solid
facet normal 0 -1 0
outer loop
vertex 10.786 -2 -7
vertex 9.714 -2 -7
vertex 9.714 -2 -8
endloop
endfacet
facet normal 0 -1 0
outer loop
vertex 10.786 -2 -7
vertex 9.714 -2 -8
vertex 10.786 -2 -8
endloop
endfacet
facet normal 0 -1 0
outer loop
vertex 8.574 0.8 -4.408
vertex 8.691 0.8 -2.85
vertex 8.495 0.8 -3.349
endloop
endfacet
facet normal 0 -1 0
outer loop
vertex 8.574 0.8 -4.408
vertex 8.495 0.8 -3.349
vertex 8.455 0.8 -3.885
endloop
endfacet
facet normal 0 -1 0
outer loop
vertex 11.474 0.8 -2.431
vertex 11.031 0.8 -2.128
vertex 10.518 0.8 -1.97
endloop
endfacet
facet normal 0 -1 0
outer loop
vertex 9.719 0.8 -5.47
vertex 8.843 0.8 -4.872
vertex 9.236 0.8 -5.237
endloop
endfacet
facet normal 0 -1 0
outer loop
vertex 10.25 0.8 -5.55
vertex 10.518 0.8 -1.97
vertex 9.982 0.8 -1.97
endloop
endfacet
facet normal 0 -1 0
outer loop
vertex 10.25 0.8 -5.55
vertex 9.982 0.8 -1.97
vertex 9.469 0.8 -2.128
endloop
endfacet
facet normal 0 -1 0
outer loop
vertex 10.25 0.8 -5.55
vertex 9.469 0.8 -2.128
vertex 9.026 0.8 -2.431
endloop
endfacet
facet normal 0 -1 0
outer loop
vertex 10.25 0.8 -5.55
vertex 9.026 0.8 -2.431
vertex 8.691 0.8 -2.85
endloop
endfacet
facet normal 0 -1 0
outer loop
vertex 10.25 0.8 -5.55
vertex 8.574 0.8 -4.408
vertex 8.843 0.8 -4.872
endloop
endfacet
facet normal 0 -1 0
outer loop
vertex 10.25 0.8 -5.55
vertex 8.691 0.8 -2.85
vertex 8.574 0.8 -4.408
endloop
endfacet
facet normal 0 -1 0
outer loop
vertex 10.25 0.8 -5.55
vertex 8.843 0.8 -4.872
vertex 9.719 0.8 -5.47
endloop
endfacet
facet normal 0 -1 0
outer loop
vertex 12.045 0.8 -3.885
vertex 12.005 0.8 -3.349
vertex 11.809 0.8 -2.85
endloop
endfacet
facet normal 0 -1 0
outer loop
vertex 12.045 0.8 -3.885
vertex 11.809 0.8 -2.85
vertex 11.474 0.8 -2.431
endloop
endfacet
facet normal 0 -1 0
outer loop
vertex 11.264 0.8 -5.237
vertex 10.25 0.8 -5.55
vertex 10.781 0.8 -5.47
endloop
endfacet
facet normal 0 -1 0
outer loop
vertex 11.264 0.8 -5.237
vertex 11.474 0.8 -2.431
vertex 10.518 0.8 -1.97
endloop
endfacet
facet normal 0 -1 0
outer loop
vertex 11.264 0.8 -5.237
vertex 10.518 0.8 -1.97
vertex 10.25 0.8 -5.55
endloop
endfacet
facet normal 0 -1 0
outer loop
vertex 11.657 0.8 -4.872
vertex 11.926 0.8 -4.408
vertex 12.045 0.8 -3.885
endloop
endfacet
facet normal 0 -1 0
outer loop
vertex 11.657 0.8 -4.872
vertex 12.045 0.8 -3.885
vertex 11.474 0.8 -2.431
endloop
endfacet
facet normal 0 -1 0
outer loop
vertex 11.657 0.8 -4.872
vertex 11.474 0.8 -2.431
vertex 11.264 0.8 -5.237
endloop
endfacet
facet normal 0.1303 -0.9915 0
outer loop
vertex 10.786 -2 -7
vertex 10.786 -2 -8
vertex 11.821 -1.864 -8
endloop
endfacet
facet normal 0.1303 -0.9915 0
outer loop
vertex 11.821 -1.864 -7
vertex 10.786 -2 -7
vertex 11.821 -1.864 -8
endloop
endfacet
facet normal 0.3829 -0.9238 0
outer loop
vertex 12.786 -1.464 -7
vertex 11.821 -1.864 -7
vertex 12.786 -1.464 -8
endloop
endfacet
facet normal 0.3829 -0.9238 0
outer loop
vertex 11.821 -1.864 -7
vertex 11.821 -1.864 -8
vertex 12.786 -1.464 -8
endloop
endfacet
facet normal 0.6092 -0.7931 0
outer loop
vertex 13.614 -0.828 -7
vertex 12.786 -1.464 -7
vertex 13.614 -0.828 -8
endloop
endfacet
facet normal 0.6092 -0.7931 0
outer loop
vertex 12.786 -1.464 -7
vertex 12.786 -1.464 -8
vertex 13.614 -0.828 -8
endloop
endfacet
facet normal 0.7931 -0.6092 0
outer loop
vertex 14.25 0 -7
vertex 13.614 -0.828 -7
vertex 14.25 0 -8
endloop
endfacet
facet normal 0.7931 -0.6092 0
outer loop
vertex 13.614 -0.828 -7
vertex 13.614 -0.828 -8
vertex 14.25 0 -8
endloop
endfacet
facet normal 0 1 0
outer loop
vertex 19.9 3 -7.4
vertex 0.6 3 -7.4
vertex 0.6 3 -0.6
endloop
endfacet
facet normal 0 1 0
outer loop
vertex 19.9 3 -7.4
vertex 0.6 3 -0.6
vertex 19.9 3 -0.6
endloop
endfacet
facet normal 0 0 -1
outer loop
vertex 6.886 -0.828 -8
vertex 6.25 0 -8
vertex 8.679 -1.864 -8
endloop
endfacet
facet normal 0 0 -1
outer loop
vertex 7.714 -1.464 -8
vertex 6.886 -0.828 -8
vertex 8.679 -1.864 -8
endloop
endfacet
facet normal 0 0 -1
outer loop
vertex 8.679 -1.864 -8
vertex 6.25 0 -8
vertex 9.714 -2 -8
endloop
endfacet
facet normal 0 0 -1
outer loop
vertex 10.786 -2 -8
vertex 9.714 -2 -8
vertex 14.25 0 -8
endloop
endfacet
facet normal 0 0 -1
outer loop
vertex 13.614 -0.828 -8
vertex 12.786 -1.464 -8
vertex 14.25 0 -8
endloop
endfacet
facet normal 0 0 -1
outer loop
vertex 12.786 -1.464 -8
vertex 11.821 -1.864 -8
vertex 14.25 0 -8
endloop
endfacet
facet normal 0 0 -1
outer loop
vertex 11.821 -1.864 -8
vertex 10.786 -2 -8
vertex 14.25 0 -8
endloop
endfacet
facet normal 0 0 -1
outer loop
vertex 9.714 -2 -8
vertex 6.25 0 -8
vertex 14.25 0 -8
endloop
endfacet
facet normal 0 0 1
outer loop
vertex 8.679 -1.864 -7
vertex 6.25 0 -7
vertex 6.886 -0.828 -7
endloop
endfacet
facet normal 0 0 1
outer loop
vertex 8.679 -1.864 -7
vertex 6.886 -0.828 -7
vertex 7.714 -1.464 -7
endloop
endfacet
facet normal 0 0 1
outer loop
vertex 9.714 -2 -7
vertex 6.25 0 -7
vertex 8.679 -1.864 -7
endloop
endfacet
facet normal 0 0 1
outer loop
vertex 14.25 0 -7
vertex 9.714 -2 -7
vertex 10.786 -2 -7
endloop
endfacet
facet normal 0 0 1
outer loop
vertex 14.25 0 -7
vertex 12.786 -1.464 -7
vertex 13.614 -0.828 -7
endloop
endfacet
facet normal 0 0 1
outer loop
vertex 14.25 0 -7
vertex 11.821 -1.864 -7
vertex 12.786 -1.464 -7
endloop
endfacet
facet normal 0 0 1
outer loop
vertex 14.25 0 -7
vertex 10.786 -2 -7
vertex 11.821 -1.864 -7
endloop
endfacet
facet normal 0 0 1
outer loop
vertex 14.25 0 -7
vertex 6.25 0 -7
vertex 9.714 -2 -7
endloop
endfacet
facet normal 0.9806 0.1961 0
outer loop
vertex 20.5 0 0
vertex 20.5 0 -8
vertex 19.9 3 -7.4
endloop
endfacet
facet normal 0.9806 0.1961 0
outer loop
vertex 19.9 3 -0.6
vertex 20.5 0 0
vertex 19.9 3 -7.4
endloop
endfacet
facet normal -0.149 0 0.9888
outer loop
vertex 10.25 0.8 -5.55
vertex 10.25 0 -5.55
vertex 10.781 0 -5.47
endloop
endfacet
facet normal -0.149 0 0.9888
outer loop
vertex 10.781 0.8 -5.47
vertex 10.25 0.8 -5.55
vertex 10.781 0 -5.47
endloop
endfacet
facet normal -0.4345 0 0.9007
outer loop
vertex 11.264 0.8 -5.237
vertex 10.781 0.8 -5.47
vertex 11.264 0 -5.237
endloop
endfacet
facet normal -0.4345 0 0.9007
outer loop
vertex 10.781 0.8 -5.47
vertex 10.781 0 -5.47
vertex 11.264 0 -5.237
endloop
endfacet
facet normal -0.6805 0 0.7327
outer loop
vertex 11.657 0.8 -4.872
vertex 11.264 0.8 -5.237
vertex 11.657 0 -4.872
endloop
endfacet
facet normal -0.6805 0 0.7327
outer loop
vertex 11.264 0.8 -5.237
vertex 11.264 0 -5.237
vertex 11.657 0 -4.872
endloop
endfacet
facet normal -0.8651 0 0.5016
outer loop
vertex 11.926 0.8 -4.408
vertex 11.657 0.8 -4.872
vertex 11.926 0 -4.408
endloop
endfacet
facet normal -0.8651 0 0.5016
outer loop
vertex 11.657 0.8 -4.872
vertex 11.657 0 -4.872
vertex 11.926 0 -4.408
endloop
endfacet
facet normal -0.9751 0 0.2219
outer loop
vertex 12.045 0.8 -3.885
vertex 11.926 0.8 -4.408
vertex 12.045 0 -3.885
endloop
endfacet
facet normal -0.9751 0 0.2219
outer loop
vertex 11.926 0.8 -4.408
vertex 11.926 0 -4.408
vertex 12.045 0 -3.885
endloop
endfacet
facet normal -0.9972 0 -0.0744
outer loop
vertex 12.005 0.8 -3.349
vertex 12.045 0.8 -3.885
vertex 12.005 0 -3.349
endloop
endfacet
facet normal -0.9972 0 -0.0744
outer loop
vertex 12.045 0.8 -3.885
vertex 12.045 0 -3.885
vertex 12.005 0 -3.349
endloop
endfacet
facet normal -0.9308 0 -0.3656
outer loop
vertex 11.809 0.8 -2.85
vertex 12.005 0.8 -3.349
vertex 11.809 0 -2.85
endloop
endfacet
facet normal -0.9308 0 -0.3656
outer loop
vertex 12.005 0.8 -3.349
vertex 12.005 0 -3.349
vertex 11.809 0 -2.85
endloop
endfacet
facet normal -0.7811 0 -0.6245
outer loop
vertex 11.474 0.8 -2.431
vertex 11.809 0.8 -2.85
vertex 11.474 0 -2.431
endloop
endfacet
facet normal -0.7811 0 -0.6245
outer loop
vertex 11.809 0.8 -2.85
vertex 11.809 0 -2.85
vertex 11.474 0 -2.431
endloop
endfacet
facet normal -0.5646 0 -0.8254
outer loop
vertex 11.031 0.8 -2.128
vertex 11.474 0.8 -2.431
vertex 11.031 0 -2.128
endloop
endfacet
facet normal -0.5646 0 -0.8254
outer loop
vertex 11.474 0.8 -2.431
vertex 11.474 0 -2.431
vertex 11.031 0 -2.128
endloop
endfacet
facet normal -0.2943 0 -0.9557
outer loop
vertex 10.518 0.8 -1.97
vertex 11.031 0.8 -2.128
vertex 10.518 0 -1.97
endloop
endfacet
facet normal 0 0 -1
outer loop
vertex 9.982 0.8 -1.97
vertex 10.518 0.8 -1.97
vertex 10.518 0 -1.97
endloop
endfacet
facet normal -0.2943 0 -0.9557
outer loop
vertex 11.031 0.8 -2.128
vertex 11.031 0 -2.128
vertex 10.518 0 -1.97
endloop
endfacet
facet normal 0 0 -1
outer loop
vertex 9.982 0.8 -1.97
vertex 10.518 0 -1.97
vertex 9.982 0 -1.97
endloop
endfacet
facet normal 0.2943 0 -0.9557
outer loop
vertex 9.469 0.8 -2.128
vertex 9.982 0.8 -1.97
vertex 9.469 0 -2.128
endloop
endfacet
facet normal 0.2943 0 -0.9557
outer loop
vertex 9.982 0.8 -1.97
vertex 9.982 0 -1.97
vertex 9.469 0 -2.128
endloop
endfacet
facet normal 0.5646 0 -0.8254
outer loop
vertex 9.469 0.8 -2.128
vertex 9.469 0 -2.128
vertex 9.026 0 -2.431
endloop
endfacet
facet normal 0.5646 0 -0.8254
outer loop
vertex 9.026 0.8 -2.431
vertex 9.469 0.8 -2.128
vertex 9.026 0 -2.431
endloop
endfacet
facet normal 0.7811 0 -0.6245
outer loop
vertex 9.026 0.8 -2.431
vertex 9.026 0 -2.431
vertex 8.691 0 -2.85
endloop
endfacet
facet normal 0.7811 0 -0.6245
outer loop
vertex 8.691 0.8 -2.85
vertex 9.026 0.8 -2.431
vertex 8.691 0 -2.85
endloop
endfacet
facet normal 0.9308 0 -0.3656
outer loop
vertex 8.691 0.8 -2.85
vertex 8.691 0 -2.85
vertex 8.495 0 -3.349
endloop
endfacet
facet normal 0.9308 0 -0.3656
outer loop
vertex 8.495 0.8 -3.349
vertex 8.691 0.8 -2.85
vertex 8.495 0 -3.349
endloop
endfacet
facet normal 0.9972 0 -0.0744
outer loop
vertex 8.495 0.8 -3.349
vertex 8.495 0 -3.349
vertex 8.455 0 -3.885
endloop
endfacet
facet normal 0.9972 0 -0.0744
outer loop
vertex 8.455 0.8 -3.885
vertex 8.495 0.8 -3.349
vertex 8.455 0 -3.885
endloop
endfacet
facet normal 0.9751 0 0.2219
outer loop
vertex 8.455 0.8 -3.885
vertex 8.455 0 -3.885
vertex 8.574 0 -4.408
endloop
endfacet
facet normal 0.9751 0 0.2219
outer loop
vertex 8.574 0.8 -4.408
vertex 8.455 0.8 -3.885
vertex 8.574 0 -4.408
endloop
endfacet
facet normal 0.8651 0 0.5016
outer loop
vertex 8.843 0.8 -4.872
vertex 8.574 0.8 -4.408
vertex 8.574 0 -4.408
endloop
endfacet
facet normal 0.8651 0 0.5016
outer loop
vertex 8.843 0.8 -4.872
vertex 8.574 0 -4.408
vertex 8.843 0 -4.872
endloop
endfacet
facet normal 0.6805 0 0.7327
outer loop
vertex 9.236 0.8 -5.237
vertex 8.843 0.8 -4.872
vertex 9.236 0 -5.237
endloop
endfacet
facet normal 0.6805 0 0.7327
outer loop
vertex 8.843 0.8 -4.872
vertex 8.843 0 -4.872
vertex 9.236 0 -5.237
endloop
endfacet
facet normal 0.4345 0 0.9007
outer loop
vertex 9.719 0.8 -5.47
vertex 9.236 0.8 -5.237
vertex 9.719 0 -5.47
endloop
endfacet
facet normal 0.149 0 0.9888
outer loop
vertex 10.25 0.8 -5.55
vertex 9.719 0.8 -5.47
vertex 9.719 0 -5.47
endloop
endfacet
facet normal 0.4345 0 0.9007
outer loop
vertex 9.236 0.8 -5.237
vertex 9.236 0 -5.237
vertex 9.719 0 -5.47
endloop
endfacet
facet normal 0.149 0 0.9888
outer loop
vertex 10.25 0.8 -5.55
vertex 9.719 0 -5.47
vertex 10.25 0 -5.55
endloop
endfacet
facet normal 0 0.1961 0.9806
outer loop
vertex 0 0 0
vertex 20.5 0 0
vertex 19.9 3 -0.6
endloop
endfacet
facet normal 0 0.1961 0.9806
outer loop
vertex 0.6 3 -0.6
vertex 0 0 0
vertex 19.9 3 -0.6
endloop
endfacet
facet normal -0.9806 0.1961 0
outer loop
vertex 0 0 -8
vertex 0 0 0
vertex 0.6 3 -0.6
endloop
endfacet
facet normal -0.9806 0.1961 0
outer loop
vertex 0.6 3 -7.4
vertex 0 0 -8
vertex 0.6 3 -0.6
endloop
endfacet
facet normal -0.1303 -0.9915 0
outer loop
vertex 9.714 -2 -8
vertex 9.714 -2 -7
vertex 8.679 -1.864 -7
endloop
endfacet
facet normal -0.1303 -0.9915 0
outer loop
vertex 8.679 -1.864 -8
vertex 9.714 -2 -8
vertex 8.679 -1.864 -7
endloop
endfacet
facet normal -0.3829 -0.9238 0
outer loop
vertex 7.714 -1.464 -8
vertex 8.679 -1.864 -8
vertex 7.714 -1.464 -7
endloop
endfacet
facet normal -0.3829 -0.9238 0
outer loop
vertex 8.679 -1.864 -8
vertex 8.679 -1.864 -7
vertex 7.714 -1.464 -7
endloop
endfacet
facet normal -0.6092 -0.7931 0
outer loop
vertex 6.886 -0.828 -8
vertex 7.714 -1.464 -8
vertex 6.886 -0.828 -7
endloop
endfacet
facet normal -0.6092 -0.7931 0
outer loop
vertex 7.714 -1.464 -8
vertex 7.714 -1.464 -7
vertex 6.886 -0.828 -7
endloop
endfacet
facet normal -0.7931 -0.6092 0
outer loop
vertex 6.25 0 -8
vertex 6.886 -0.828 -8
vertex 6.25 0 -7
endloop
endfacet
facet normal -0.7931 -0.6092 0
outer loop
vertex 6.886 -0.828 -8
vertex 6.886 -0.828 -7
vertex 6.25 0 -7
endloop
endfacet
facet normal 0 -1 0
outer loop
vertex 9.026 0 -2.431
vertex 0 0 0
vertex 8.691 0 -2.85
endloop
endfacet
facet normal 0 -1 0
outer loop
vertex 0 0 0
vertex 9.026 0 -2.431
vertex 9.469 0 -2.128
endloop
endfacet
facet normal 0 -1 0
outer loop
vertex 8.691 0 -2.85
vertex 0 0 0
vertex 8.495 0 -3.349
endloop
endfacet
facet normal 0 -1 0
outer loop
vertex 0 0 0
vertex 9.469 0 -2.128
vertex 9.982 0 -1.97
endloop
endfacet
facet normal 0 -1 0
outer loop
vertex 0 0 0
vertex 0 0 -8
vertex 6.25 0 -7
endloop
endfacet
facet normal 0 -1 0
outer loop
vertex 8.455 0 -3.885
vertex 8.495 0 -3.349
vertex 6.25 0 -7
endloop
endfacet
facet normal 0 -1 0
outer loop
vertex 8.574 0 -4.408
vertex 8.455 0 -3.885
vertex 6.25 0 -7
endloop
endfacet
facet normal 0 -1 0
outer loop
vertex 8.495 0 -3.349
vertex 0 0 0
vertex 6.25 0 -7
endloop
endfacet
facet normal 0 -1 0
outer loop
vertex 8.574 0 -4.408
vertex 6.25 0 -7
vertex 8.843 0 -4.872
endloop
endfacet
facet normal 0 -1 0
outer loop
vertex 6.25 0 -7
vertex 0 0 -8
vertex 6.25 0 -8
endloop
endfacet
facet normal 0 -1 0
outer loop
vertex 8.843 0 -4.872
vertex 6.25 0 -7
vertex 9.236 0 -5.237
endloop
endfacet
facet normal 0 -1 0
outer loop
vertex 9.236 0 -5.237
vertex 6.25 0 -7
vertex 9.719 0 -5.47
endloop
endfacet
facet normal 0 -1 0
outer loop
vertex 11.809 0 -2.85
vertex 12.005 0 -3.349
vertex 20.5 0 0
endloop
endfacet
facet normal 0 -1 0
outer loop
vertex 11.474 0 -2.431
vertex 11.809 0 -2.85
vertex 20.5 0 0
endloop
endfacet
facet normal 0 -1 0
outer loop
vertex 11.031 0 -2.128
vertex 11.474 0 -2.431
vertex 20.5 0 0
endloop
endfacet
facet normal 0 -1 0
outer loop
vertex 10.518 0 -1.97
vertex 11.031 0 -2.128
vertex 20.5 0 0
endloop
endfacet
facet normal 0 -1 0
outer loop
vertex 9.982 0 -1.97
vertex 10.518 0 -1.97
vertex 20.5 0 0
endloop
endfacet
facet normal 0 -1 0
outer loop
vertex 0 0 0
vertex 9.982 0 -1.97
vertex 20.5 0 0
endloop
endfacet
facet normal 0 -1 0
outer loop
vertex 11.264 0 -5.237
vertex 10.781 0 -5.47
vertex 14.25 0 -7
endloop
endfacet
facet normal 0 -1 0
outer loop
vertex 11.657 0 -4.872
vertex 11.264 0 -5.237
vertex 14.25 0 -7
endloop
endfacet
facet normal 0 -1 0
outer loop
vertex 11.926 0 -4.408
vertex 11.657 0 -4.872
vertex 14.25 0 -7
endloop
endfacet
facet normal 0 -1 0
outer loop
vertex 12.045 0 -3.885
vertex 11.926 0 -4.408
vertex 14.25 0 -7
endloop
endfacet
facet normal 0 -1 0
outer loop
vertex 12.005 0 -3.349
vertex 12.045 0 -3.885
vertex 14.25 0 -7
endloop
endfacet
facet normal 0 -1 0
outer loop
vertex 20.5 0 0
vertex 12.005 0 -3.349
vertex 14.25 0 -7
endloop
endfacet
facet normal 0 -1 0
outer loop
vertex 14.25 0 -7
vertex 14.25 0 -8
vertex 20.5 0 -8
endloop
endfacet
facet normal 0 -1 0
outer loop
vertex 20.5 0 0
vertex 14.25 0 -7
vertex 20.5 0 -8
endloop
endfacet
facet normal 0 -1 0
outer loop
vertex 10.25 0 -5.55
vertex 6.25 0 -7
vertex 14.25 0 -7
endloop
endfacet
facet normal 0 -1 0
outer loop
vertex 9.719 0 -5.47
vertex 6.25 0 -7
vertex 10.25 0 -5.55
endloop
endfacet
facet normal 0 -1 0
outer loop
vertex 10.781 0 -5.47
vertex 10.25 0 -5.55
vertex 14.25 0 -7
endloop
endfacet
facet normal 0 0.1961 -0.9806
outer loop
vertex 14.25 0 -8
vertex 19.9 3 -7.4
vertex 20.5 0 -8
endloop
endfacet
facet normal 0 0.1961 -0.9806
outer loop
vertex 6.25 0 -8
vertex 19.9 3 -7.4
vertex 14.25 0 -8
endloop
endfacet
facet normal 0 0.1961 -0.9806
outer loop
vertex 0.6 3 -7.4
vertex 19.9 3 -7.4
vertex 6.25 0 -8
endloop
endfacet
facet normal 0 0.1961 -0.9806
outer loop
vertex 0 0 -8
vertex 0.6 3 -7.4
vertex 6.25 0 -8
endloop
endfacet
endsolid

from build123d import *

# Parameters (mm, degrees)
SKETCH1_W               = 20.5
SKETCH1_H               = 8
BOSS_EXTRUDE1_DEPTH     = 3
CUT_EXTRUDE1_DEPTH      = 23.209232315
CUT_EXTRUDE1_DEPTH_BACK = 23.209232315
CUT_EXTRUDE2_DEPTH      = 23.209232315
CUT_EXTRUDE2_DEPTH_BACK = 23.209232315
SKETCH4_R               = 1.8
CUT_EXTRUDE3_DEPTH      = 0.8
SKETCH5_W               = 8
SKETCH5_H               = 1
BOSS_EXTRUDE2_DEPTH     = 2
FILLET1_R               = 4


with BuildPart() as part:
    # Sketch1 → Boss-Extrude1 (new body)
    with BuildSketch(Plane(origin=(0, 0, 0), x_dir=(1, 0, 0), z_dir=(0, 1, 0))):
        with Locations((10.25, 4)):
            Rectangle(SKETCH1_W, SKETCH1_H)
    extrude(amount=BOSS_EXTRUDE1_DEPTH)

    # Sketch2 → Cut-Extrude1 (cut, two sides: drawn at the far end of the back side and taken through both)
    with BuildSketch(Plane.XY.offset(-CUT_EXTRUDE1_DEPTH_BACK)):
        Polygon((0, 0), (0.6, 3), (0, 3), align=None)
        Polygon((20.5, 0), (19.9, 3), (20.5, 3), align=None)
    extrude(amount=CUT_EXTRUDE1_DEPTH + CUT_EXTRUDE1_DEPTH_BACK, mode=Mode.SUBTRACT)

    # Sketch3 → Cut-Extrude2 (cut, two sides: drawn at the far end of the back side and taken through both)
    with BuildSketch(Plane(origin=(0, 0, 0), x_dir=(0, 0, -1), z_dir=(1, 0, 0)).offset(-CUT_EXTRUDE2_DEPTH_BACK)):
        Polygon((0, 0), (0.6, 3), (0, 3), align=None)
        Polygon((8, 3), (7.4, 3), (8, 0), align=None)
    extrude(amount=CUT_EXTRUDE2_DEPTH + CUT_EXTRUDE2_DEPTH_BACK, mode=Mode.SUBTRACT)

    # Sketch4 → Cut-Extrude3 (cut)
    with BuildSketch(Plane.XZ):
        with Locations(Location((10.25000125, -3.75, 0), (0, 0, 270))):
            Circle(SKETCH4_R)
    extrude(amount=-CUT_EXTRUDE3_DEPTH, mode=Mode.SUBTRACT)

    # Sketch5 → Boss-Extrude2 (add)
    with BuildSketch(Plane.XZ):
        with Locations((10.250011, -7.5)):
            Rectangle(SKETCH5_W, SKETCH5_H)
    extrude(amount=BOSS_EXTRUDE2_DEPTH)

    # Fillet1
    # the kernel refuses this fillet: 4 mm, written as the material it takes off along each edge
    with BuildSketch(Plane(origin=(14.250011, -2, -16.660254038), x_dir=(0, 1, 0), z_dir=(0, 0, 1)), Plane(origin=(6.250011, -2, 1.660254038), x_dir=(0, 1, 0), z_dir=(0, 0, -1))) as fillet1_piece_1:
        with BuildLine():
            CenterArc((4, 3.464101615), FILLET1_R, 180, 60)
            Line((0, 3.464101615), (-0.08, 3.464101615))
            Line((-0.08, 3.464101615), (-0.08, 0))
            Line((-0.08, 0), (0, -0.08))
            ThreePointArc((0, -0.08), (1, -0.08), (1.96, -0.069282032))
            Line((1.96, -0.069282032), (2, 0))
        make_face()
    extrude(amount=18.320508076, mode=Mode.SUBTRACT)


solid = part.part
